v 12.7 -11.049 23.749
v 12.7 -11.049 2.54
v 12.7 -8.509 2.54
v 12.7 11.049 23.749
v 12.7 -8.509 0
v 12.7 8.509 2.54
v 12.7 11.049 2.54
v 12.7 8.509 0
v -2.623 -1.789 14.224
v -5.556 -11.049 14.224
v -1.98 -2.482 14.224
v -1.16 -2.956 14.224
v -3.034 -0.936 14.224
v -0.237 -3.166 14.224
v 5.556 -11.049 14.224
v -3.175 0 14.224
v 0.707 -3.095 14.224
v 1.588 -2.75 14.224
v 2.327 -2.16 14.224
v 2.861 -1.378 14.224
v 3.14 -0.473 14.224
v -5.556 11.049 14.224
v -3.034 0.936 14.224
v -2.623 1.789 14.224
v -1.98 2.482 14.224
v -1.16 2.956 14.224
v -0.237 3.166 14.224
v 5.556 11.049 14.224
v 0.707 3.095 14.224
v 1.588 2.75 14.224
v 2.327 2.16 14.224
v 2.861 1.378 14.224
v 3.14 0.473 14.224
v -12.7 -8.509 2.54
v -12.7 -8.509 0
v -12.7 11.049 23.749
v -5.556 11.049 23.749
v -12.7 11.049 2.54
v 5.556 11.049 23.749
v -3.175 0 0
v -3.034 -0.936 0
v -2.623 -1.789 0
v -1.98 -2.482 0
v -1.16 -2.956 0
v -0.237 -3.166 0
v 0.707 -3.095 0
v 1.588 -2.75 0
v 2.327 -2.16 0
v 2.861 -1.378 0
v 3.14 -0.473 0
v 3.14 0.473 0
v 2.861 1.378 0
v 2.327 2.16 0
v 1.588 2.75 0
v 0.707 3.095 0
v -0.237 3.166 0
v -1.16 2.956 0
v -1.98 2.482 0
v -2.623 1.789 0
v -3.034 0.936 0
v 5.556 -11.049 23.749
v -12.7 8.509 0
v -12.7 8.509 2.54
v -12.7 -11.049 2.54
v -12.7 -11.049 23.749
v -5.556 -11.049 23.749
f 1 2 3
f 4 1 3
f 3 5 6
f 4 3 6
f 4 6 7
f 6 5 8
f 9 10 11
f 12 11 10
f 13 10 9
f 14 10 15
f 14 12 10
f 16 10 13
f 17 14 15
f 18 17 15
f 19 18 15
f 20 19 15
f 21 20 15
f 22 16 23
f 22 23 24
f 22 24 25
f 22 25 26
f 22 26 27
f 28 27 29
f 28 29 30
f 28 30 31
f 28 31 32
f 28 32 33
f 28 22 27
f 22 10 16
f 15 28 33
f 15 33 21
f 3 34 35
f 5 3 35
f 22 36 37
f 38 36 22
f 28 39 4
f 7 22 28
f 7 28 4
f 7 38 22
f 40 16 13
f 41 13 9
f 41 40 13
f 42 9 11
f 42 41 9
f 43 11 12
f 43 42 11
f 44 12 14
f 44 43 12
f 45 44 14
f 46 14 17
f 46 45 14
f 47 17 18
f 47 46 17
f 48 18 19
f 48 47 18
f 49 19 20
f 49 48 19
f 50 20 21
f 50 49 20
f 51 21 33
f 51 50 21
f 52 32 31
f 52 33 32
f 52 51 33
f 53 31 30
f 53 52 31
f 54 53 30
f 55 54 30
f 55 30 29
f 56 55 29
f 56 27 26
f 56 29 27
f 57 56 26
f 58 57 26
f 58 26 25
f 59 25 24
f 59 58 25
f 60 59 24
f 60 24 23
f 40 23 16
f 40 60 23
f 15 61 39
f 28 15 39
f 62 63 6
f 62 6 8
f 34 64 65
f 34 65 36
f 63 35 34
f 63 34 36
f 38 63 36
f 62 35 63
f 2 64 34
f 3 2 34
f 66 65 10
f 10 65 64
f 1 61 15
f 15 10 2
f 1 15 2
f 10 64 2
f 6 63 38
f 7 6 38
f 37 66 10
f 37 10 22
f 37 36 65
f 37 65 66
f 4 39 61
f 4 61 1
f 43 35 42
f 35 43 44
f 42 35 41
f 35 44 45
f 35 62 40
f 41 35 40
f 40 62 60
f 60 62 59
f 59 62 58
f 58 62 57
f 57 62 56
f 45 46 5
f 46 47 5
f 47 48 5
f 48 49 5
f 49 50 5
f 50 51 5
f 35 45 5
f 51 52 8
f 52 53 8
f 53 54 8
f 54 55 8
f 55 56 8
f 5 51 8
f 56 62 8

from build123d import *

# Parameters (mm, degrees)
SKETCH1_W               = 25.4
SKETCH1_H               = 22.098
SKETCH1_R               = 3.175
BOSS_EXTRUDE1_DEPTH     = 23.749
SKETCH2_W               = 11.1125
SKETCH2_H               = 22.098
CUT_EXTRUDE1_DEPTH      = 9.525
CUT_EXTRUDE2_DEPTH      = 30.109884953
CUT_EXTRUDE2_DEPTH_BACK = 30.109884953
SKETCH3_W               = 2.54
SKETCH3_H               = 2.54


with BuildPart() as part:
    # Sketch1 → Boss-Extrude1 (new body)
    with BuildSketch(Plane.XY):
        Rectangle(SKETCH1_W, SKETCH1_H)
        with Locations(Location((0, 0, 0), (0, 0, 180))):
            Circle(SKETCH1_R, mode=Mode.SUBTRACT)
    extrude(amount=BOSS_EXTRUDE1_DEPTH)

    # Sketch2 → Cut-Extrude1 (cut)
    with BuildSketch(Plane.XY.offset(23.749)):
        Rectangle(SKETCH2_W, SKETCH2_H)
    extrude(amount=-CUT_EXTRUDE1_DEPTH, mode=Mode.SUBTRACT)

    # Sketch3 → Cut-Extrude2 (cut, two sides: drawn at the far end of the back side and taken through both)
    with BuildSketch(Plane(origin=(0, 0, 0), x_dir=(0, 0, -1), z_dir=(1, 0, 0)).offset(-CUT_EXTRUDE2_DEPTH_BACK)):
        with Locations((-1.27, 9.779)):
            Rectangle(SKETCH3_W, SKETCH3_H)
        with Locations((-1.27, -9.779)):
            Rectangle(SKETCH3_W, SKETCH3_H)
    extrude(amount=CUT_EXTRUDE2_DEPTH + CUT_EXTRUDE2_DEPTH_BACK, mode=Mode.SUBTRACT)


solid = part.part
